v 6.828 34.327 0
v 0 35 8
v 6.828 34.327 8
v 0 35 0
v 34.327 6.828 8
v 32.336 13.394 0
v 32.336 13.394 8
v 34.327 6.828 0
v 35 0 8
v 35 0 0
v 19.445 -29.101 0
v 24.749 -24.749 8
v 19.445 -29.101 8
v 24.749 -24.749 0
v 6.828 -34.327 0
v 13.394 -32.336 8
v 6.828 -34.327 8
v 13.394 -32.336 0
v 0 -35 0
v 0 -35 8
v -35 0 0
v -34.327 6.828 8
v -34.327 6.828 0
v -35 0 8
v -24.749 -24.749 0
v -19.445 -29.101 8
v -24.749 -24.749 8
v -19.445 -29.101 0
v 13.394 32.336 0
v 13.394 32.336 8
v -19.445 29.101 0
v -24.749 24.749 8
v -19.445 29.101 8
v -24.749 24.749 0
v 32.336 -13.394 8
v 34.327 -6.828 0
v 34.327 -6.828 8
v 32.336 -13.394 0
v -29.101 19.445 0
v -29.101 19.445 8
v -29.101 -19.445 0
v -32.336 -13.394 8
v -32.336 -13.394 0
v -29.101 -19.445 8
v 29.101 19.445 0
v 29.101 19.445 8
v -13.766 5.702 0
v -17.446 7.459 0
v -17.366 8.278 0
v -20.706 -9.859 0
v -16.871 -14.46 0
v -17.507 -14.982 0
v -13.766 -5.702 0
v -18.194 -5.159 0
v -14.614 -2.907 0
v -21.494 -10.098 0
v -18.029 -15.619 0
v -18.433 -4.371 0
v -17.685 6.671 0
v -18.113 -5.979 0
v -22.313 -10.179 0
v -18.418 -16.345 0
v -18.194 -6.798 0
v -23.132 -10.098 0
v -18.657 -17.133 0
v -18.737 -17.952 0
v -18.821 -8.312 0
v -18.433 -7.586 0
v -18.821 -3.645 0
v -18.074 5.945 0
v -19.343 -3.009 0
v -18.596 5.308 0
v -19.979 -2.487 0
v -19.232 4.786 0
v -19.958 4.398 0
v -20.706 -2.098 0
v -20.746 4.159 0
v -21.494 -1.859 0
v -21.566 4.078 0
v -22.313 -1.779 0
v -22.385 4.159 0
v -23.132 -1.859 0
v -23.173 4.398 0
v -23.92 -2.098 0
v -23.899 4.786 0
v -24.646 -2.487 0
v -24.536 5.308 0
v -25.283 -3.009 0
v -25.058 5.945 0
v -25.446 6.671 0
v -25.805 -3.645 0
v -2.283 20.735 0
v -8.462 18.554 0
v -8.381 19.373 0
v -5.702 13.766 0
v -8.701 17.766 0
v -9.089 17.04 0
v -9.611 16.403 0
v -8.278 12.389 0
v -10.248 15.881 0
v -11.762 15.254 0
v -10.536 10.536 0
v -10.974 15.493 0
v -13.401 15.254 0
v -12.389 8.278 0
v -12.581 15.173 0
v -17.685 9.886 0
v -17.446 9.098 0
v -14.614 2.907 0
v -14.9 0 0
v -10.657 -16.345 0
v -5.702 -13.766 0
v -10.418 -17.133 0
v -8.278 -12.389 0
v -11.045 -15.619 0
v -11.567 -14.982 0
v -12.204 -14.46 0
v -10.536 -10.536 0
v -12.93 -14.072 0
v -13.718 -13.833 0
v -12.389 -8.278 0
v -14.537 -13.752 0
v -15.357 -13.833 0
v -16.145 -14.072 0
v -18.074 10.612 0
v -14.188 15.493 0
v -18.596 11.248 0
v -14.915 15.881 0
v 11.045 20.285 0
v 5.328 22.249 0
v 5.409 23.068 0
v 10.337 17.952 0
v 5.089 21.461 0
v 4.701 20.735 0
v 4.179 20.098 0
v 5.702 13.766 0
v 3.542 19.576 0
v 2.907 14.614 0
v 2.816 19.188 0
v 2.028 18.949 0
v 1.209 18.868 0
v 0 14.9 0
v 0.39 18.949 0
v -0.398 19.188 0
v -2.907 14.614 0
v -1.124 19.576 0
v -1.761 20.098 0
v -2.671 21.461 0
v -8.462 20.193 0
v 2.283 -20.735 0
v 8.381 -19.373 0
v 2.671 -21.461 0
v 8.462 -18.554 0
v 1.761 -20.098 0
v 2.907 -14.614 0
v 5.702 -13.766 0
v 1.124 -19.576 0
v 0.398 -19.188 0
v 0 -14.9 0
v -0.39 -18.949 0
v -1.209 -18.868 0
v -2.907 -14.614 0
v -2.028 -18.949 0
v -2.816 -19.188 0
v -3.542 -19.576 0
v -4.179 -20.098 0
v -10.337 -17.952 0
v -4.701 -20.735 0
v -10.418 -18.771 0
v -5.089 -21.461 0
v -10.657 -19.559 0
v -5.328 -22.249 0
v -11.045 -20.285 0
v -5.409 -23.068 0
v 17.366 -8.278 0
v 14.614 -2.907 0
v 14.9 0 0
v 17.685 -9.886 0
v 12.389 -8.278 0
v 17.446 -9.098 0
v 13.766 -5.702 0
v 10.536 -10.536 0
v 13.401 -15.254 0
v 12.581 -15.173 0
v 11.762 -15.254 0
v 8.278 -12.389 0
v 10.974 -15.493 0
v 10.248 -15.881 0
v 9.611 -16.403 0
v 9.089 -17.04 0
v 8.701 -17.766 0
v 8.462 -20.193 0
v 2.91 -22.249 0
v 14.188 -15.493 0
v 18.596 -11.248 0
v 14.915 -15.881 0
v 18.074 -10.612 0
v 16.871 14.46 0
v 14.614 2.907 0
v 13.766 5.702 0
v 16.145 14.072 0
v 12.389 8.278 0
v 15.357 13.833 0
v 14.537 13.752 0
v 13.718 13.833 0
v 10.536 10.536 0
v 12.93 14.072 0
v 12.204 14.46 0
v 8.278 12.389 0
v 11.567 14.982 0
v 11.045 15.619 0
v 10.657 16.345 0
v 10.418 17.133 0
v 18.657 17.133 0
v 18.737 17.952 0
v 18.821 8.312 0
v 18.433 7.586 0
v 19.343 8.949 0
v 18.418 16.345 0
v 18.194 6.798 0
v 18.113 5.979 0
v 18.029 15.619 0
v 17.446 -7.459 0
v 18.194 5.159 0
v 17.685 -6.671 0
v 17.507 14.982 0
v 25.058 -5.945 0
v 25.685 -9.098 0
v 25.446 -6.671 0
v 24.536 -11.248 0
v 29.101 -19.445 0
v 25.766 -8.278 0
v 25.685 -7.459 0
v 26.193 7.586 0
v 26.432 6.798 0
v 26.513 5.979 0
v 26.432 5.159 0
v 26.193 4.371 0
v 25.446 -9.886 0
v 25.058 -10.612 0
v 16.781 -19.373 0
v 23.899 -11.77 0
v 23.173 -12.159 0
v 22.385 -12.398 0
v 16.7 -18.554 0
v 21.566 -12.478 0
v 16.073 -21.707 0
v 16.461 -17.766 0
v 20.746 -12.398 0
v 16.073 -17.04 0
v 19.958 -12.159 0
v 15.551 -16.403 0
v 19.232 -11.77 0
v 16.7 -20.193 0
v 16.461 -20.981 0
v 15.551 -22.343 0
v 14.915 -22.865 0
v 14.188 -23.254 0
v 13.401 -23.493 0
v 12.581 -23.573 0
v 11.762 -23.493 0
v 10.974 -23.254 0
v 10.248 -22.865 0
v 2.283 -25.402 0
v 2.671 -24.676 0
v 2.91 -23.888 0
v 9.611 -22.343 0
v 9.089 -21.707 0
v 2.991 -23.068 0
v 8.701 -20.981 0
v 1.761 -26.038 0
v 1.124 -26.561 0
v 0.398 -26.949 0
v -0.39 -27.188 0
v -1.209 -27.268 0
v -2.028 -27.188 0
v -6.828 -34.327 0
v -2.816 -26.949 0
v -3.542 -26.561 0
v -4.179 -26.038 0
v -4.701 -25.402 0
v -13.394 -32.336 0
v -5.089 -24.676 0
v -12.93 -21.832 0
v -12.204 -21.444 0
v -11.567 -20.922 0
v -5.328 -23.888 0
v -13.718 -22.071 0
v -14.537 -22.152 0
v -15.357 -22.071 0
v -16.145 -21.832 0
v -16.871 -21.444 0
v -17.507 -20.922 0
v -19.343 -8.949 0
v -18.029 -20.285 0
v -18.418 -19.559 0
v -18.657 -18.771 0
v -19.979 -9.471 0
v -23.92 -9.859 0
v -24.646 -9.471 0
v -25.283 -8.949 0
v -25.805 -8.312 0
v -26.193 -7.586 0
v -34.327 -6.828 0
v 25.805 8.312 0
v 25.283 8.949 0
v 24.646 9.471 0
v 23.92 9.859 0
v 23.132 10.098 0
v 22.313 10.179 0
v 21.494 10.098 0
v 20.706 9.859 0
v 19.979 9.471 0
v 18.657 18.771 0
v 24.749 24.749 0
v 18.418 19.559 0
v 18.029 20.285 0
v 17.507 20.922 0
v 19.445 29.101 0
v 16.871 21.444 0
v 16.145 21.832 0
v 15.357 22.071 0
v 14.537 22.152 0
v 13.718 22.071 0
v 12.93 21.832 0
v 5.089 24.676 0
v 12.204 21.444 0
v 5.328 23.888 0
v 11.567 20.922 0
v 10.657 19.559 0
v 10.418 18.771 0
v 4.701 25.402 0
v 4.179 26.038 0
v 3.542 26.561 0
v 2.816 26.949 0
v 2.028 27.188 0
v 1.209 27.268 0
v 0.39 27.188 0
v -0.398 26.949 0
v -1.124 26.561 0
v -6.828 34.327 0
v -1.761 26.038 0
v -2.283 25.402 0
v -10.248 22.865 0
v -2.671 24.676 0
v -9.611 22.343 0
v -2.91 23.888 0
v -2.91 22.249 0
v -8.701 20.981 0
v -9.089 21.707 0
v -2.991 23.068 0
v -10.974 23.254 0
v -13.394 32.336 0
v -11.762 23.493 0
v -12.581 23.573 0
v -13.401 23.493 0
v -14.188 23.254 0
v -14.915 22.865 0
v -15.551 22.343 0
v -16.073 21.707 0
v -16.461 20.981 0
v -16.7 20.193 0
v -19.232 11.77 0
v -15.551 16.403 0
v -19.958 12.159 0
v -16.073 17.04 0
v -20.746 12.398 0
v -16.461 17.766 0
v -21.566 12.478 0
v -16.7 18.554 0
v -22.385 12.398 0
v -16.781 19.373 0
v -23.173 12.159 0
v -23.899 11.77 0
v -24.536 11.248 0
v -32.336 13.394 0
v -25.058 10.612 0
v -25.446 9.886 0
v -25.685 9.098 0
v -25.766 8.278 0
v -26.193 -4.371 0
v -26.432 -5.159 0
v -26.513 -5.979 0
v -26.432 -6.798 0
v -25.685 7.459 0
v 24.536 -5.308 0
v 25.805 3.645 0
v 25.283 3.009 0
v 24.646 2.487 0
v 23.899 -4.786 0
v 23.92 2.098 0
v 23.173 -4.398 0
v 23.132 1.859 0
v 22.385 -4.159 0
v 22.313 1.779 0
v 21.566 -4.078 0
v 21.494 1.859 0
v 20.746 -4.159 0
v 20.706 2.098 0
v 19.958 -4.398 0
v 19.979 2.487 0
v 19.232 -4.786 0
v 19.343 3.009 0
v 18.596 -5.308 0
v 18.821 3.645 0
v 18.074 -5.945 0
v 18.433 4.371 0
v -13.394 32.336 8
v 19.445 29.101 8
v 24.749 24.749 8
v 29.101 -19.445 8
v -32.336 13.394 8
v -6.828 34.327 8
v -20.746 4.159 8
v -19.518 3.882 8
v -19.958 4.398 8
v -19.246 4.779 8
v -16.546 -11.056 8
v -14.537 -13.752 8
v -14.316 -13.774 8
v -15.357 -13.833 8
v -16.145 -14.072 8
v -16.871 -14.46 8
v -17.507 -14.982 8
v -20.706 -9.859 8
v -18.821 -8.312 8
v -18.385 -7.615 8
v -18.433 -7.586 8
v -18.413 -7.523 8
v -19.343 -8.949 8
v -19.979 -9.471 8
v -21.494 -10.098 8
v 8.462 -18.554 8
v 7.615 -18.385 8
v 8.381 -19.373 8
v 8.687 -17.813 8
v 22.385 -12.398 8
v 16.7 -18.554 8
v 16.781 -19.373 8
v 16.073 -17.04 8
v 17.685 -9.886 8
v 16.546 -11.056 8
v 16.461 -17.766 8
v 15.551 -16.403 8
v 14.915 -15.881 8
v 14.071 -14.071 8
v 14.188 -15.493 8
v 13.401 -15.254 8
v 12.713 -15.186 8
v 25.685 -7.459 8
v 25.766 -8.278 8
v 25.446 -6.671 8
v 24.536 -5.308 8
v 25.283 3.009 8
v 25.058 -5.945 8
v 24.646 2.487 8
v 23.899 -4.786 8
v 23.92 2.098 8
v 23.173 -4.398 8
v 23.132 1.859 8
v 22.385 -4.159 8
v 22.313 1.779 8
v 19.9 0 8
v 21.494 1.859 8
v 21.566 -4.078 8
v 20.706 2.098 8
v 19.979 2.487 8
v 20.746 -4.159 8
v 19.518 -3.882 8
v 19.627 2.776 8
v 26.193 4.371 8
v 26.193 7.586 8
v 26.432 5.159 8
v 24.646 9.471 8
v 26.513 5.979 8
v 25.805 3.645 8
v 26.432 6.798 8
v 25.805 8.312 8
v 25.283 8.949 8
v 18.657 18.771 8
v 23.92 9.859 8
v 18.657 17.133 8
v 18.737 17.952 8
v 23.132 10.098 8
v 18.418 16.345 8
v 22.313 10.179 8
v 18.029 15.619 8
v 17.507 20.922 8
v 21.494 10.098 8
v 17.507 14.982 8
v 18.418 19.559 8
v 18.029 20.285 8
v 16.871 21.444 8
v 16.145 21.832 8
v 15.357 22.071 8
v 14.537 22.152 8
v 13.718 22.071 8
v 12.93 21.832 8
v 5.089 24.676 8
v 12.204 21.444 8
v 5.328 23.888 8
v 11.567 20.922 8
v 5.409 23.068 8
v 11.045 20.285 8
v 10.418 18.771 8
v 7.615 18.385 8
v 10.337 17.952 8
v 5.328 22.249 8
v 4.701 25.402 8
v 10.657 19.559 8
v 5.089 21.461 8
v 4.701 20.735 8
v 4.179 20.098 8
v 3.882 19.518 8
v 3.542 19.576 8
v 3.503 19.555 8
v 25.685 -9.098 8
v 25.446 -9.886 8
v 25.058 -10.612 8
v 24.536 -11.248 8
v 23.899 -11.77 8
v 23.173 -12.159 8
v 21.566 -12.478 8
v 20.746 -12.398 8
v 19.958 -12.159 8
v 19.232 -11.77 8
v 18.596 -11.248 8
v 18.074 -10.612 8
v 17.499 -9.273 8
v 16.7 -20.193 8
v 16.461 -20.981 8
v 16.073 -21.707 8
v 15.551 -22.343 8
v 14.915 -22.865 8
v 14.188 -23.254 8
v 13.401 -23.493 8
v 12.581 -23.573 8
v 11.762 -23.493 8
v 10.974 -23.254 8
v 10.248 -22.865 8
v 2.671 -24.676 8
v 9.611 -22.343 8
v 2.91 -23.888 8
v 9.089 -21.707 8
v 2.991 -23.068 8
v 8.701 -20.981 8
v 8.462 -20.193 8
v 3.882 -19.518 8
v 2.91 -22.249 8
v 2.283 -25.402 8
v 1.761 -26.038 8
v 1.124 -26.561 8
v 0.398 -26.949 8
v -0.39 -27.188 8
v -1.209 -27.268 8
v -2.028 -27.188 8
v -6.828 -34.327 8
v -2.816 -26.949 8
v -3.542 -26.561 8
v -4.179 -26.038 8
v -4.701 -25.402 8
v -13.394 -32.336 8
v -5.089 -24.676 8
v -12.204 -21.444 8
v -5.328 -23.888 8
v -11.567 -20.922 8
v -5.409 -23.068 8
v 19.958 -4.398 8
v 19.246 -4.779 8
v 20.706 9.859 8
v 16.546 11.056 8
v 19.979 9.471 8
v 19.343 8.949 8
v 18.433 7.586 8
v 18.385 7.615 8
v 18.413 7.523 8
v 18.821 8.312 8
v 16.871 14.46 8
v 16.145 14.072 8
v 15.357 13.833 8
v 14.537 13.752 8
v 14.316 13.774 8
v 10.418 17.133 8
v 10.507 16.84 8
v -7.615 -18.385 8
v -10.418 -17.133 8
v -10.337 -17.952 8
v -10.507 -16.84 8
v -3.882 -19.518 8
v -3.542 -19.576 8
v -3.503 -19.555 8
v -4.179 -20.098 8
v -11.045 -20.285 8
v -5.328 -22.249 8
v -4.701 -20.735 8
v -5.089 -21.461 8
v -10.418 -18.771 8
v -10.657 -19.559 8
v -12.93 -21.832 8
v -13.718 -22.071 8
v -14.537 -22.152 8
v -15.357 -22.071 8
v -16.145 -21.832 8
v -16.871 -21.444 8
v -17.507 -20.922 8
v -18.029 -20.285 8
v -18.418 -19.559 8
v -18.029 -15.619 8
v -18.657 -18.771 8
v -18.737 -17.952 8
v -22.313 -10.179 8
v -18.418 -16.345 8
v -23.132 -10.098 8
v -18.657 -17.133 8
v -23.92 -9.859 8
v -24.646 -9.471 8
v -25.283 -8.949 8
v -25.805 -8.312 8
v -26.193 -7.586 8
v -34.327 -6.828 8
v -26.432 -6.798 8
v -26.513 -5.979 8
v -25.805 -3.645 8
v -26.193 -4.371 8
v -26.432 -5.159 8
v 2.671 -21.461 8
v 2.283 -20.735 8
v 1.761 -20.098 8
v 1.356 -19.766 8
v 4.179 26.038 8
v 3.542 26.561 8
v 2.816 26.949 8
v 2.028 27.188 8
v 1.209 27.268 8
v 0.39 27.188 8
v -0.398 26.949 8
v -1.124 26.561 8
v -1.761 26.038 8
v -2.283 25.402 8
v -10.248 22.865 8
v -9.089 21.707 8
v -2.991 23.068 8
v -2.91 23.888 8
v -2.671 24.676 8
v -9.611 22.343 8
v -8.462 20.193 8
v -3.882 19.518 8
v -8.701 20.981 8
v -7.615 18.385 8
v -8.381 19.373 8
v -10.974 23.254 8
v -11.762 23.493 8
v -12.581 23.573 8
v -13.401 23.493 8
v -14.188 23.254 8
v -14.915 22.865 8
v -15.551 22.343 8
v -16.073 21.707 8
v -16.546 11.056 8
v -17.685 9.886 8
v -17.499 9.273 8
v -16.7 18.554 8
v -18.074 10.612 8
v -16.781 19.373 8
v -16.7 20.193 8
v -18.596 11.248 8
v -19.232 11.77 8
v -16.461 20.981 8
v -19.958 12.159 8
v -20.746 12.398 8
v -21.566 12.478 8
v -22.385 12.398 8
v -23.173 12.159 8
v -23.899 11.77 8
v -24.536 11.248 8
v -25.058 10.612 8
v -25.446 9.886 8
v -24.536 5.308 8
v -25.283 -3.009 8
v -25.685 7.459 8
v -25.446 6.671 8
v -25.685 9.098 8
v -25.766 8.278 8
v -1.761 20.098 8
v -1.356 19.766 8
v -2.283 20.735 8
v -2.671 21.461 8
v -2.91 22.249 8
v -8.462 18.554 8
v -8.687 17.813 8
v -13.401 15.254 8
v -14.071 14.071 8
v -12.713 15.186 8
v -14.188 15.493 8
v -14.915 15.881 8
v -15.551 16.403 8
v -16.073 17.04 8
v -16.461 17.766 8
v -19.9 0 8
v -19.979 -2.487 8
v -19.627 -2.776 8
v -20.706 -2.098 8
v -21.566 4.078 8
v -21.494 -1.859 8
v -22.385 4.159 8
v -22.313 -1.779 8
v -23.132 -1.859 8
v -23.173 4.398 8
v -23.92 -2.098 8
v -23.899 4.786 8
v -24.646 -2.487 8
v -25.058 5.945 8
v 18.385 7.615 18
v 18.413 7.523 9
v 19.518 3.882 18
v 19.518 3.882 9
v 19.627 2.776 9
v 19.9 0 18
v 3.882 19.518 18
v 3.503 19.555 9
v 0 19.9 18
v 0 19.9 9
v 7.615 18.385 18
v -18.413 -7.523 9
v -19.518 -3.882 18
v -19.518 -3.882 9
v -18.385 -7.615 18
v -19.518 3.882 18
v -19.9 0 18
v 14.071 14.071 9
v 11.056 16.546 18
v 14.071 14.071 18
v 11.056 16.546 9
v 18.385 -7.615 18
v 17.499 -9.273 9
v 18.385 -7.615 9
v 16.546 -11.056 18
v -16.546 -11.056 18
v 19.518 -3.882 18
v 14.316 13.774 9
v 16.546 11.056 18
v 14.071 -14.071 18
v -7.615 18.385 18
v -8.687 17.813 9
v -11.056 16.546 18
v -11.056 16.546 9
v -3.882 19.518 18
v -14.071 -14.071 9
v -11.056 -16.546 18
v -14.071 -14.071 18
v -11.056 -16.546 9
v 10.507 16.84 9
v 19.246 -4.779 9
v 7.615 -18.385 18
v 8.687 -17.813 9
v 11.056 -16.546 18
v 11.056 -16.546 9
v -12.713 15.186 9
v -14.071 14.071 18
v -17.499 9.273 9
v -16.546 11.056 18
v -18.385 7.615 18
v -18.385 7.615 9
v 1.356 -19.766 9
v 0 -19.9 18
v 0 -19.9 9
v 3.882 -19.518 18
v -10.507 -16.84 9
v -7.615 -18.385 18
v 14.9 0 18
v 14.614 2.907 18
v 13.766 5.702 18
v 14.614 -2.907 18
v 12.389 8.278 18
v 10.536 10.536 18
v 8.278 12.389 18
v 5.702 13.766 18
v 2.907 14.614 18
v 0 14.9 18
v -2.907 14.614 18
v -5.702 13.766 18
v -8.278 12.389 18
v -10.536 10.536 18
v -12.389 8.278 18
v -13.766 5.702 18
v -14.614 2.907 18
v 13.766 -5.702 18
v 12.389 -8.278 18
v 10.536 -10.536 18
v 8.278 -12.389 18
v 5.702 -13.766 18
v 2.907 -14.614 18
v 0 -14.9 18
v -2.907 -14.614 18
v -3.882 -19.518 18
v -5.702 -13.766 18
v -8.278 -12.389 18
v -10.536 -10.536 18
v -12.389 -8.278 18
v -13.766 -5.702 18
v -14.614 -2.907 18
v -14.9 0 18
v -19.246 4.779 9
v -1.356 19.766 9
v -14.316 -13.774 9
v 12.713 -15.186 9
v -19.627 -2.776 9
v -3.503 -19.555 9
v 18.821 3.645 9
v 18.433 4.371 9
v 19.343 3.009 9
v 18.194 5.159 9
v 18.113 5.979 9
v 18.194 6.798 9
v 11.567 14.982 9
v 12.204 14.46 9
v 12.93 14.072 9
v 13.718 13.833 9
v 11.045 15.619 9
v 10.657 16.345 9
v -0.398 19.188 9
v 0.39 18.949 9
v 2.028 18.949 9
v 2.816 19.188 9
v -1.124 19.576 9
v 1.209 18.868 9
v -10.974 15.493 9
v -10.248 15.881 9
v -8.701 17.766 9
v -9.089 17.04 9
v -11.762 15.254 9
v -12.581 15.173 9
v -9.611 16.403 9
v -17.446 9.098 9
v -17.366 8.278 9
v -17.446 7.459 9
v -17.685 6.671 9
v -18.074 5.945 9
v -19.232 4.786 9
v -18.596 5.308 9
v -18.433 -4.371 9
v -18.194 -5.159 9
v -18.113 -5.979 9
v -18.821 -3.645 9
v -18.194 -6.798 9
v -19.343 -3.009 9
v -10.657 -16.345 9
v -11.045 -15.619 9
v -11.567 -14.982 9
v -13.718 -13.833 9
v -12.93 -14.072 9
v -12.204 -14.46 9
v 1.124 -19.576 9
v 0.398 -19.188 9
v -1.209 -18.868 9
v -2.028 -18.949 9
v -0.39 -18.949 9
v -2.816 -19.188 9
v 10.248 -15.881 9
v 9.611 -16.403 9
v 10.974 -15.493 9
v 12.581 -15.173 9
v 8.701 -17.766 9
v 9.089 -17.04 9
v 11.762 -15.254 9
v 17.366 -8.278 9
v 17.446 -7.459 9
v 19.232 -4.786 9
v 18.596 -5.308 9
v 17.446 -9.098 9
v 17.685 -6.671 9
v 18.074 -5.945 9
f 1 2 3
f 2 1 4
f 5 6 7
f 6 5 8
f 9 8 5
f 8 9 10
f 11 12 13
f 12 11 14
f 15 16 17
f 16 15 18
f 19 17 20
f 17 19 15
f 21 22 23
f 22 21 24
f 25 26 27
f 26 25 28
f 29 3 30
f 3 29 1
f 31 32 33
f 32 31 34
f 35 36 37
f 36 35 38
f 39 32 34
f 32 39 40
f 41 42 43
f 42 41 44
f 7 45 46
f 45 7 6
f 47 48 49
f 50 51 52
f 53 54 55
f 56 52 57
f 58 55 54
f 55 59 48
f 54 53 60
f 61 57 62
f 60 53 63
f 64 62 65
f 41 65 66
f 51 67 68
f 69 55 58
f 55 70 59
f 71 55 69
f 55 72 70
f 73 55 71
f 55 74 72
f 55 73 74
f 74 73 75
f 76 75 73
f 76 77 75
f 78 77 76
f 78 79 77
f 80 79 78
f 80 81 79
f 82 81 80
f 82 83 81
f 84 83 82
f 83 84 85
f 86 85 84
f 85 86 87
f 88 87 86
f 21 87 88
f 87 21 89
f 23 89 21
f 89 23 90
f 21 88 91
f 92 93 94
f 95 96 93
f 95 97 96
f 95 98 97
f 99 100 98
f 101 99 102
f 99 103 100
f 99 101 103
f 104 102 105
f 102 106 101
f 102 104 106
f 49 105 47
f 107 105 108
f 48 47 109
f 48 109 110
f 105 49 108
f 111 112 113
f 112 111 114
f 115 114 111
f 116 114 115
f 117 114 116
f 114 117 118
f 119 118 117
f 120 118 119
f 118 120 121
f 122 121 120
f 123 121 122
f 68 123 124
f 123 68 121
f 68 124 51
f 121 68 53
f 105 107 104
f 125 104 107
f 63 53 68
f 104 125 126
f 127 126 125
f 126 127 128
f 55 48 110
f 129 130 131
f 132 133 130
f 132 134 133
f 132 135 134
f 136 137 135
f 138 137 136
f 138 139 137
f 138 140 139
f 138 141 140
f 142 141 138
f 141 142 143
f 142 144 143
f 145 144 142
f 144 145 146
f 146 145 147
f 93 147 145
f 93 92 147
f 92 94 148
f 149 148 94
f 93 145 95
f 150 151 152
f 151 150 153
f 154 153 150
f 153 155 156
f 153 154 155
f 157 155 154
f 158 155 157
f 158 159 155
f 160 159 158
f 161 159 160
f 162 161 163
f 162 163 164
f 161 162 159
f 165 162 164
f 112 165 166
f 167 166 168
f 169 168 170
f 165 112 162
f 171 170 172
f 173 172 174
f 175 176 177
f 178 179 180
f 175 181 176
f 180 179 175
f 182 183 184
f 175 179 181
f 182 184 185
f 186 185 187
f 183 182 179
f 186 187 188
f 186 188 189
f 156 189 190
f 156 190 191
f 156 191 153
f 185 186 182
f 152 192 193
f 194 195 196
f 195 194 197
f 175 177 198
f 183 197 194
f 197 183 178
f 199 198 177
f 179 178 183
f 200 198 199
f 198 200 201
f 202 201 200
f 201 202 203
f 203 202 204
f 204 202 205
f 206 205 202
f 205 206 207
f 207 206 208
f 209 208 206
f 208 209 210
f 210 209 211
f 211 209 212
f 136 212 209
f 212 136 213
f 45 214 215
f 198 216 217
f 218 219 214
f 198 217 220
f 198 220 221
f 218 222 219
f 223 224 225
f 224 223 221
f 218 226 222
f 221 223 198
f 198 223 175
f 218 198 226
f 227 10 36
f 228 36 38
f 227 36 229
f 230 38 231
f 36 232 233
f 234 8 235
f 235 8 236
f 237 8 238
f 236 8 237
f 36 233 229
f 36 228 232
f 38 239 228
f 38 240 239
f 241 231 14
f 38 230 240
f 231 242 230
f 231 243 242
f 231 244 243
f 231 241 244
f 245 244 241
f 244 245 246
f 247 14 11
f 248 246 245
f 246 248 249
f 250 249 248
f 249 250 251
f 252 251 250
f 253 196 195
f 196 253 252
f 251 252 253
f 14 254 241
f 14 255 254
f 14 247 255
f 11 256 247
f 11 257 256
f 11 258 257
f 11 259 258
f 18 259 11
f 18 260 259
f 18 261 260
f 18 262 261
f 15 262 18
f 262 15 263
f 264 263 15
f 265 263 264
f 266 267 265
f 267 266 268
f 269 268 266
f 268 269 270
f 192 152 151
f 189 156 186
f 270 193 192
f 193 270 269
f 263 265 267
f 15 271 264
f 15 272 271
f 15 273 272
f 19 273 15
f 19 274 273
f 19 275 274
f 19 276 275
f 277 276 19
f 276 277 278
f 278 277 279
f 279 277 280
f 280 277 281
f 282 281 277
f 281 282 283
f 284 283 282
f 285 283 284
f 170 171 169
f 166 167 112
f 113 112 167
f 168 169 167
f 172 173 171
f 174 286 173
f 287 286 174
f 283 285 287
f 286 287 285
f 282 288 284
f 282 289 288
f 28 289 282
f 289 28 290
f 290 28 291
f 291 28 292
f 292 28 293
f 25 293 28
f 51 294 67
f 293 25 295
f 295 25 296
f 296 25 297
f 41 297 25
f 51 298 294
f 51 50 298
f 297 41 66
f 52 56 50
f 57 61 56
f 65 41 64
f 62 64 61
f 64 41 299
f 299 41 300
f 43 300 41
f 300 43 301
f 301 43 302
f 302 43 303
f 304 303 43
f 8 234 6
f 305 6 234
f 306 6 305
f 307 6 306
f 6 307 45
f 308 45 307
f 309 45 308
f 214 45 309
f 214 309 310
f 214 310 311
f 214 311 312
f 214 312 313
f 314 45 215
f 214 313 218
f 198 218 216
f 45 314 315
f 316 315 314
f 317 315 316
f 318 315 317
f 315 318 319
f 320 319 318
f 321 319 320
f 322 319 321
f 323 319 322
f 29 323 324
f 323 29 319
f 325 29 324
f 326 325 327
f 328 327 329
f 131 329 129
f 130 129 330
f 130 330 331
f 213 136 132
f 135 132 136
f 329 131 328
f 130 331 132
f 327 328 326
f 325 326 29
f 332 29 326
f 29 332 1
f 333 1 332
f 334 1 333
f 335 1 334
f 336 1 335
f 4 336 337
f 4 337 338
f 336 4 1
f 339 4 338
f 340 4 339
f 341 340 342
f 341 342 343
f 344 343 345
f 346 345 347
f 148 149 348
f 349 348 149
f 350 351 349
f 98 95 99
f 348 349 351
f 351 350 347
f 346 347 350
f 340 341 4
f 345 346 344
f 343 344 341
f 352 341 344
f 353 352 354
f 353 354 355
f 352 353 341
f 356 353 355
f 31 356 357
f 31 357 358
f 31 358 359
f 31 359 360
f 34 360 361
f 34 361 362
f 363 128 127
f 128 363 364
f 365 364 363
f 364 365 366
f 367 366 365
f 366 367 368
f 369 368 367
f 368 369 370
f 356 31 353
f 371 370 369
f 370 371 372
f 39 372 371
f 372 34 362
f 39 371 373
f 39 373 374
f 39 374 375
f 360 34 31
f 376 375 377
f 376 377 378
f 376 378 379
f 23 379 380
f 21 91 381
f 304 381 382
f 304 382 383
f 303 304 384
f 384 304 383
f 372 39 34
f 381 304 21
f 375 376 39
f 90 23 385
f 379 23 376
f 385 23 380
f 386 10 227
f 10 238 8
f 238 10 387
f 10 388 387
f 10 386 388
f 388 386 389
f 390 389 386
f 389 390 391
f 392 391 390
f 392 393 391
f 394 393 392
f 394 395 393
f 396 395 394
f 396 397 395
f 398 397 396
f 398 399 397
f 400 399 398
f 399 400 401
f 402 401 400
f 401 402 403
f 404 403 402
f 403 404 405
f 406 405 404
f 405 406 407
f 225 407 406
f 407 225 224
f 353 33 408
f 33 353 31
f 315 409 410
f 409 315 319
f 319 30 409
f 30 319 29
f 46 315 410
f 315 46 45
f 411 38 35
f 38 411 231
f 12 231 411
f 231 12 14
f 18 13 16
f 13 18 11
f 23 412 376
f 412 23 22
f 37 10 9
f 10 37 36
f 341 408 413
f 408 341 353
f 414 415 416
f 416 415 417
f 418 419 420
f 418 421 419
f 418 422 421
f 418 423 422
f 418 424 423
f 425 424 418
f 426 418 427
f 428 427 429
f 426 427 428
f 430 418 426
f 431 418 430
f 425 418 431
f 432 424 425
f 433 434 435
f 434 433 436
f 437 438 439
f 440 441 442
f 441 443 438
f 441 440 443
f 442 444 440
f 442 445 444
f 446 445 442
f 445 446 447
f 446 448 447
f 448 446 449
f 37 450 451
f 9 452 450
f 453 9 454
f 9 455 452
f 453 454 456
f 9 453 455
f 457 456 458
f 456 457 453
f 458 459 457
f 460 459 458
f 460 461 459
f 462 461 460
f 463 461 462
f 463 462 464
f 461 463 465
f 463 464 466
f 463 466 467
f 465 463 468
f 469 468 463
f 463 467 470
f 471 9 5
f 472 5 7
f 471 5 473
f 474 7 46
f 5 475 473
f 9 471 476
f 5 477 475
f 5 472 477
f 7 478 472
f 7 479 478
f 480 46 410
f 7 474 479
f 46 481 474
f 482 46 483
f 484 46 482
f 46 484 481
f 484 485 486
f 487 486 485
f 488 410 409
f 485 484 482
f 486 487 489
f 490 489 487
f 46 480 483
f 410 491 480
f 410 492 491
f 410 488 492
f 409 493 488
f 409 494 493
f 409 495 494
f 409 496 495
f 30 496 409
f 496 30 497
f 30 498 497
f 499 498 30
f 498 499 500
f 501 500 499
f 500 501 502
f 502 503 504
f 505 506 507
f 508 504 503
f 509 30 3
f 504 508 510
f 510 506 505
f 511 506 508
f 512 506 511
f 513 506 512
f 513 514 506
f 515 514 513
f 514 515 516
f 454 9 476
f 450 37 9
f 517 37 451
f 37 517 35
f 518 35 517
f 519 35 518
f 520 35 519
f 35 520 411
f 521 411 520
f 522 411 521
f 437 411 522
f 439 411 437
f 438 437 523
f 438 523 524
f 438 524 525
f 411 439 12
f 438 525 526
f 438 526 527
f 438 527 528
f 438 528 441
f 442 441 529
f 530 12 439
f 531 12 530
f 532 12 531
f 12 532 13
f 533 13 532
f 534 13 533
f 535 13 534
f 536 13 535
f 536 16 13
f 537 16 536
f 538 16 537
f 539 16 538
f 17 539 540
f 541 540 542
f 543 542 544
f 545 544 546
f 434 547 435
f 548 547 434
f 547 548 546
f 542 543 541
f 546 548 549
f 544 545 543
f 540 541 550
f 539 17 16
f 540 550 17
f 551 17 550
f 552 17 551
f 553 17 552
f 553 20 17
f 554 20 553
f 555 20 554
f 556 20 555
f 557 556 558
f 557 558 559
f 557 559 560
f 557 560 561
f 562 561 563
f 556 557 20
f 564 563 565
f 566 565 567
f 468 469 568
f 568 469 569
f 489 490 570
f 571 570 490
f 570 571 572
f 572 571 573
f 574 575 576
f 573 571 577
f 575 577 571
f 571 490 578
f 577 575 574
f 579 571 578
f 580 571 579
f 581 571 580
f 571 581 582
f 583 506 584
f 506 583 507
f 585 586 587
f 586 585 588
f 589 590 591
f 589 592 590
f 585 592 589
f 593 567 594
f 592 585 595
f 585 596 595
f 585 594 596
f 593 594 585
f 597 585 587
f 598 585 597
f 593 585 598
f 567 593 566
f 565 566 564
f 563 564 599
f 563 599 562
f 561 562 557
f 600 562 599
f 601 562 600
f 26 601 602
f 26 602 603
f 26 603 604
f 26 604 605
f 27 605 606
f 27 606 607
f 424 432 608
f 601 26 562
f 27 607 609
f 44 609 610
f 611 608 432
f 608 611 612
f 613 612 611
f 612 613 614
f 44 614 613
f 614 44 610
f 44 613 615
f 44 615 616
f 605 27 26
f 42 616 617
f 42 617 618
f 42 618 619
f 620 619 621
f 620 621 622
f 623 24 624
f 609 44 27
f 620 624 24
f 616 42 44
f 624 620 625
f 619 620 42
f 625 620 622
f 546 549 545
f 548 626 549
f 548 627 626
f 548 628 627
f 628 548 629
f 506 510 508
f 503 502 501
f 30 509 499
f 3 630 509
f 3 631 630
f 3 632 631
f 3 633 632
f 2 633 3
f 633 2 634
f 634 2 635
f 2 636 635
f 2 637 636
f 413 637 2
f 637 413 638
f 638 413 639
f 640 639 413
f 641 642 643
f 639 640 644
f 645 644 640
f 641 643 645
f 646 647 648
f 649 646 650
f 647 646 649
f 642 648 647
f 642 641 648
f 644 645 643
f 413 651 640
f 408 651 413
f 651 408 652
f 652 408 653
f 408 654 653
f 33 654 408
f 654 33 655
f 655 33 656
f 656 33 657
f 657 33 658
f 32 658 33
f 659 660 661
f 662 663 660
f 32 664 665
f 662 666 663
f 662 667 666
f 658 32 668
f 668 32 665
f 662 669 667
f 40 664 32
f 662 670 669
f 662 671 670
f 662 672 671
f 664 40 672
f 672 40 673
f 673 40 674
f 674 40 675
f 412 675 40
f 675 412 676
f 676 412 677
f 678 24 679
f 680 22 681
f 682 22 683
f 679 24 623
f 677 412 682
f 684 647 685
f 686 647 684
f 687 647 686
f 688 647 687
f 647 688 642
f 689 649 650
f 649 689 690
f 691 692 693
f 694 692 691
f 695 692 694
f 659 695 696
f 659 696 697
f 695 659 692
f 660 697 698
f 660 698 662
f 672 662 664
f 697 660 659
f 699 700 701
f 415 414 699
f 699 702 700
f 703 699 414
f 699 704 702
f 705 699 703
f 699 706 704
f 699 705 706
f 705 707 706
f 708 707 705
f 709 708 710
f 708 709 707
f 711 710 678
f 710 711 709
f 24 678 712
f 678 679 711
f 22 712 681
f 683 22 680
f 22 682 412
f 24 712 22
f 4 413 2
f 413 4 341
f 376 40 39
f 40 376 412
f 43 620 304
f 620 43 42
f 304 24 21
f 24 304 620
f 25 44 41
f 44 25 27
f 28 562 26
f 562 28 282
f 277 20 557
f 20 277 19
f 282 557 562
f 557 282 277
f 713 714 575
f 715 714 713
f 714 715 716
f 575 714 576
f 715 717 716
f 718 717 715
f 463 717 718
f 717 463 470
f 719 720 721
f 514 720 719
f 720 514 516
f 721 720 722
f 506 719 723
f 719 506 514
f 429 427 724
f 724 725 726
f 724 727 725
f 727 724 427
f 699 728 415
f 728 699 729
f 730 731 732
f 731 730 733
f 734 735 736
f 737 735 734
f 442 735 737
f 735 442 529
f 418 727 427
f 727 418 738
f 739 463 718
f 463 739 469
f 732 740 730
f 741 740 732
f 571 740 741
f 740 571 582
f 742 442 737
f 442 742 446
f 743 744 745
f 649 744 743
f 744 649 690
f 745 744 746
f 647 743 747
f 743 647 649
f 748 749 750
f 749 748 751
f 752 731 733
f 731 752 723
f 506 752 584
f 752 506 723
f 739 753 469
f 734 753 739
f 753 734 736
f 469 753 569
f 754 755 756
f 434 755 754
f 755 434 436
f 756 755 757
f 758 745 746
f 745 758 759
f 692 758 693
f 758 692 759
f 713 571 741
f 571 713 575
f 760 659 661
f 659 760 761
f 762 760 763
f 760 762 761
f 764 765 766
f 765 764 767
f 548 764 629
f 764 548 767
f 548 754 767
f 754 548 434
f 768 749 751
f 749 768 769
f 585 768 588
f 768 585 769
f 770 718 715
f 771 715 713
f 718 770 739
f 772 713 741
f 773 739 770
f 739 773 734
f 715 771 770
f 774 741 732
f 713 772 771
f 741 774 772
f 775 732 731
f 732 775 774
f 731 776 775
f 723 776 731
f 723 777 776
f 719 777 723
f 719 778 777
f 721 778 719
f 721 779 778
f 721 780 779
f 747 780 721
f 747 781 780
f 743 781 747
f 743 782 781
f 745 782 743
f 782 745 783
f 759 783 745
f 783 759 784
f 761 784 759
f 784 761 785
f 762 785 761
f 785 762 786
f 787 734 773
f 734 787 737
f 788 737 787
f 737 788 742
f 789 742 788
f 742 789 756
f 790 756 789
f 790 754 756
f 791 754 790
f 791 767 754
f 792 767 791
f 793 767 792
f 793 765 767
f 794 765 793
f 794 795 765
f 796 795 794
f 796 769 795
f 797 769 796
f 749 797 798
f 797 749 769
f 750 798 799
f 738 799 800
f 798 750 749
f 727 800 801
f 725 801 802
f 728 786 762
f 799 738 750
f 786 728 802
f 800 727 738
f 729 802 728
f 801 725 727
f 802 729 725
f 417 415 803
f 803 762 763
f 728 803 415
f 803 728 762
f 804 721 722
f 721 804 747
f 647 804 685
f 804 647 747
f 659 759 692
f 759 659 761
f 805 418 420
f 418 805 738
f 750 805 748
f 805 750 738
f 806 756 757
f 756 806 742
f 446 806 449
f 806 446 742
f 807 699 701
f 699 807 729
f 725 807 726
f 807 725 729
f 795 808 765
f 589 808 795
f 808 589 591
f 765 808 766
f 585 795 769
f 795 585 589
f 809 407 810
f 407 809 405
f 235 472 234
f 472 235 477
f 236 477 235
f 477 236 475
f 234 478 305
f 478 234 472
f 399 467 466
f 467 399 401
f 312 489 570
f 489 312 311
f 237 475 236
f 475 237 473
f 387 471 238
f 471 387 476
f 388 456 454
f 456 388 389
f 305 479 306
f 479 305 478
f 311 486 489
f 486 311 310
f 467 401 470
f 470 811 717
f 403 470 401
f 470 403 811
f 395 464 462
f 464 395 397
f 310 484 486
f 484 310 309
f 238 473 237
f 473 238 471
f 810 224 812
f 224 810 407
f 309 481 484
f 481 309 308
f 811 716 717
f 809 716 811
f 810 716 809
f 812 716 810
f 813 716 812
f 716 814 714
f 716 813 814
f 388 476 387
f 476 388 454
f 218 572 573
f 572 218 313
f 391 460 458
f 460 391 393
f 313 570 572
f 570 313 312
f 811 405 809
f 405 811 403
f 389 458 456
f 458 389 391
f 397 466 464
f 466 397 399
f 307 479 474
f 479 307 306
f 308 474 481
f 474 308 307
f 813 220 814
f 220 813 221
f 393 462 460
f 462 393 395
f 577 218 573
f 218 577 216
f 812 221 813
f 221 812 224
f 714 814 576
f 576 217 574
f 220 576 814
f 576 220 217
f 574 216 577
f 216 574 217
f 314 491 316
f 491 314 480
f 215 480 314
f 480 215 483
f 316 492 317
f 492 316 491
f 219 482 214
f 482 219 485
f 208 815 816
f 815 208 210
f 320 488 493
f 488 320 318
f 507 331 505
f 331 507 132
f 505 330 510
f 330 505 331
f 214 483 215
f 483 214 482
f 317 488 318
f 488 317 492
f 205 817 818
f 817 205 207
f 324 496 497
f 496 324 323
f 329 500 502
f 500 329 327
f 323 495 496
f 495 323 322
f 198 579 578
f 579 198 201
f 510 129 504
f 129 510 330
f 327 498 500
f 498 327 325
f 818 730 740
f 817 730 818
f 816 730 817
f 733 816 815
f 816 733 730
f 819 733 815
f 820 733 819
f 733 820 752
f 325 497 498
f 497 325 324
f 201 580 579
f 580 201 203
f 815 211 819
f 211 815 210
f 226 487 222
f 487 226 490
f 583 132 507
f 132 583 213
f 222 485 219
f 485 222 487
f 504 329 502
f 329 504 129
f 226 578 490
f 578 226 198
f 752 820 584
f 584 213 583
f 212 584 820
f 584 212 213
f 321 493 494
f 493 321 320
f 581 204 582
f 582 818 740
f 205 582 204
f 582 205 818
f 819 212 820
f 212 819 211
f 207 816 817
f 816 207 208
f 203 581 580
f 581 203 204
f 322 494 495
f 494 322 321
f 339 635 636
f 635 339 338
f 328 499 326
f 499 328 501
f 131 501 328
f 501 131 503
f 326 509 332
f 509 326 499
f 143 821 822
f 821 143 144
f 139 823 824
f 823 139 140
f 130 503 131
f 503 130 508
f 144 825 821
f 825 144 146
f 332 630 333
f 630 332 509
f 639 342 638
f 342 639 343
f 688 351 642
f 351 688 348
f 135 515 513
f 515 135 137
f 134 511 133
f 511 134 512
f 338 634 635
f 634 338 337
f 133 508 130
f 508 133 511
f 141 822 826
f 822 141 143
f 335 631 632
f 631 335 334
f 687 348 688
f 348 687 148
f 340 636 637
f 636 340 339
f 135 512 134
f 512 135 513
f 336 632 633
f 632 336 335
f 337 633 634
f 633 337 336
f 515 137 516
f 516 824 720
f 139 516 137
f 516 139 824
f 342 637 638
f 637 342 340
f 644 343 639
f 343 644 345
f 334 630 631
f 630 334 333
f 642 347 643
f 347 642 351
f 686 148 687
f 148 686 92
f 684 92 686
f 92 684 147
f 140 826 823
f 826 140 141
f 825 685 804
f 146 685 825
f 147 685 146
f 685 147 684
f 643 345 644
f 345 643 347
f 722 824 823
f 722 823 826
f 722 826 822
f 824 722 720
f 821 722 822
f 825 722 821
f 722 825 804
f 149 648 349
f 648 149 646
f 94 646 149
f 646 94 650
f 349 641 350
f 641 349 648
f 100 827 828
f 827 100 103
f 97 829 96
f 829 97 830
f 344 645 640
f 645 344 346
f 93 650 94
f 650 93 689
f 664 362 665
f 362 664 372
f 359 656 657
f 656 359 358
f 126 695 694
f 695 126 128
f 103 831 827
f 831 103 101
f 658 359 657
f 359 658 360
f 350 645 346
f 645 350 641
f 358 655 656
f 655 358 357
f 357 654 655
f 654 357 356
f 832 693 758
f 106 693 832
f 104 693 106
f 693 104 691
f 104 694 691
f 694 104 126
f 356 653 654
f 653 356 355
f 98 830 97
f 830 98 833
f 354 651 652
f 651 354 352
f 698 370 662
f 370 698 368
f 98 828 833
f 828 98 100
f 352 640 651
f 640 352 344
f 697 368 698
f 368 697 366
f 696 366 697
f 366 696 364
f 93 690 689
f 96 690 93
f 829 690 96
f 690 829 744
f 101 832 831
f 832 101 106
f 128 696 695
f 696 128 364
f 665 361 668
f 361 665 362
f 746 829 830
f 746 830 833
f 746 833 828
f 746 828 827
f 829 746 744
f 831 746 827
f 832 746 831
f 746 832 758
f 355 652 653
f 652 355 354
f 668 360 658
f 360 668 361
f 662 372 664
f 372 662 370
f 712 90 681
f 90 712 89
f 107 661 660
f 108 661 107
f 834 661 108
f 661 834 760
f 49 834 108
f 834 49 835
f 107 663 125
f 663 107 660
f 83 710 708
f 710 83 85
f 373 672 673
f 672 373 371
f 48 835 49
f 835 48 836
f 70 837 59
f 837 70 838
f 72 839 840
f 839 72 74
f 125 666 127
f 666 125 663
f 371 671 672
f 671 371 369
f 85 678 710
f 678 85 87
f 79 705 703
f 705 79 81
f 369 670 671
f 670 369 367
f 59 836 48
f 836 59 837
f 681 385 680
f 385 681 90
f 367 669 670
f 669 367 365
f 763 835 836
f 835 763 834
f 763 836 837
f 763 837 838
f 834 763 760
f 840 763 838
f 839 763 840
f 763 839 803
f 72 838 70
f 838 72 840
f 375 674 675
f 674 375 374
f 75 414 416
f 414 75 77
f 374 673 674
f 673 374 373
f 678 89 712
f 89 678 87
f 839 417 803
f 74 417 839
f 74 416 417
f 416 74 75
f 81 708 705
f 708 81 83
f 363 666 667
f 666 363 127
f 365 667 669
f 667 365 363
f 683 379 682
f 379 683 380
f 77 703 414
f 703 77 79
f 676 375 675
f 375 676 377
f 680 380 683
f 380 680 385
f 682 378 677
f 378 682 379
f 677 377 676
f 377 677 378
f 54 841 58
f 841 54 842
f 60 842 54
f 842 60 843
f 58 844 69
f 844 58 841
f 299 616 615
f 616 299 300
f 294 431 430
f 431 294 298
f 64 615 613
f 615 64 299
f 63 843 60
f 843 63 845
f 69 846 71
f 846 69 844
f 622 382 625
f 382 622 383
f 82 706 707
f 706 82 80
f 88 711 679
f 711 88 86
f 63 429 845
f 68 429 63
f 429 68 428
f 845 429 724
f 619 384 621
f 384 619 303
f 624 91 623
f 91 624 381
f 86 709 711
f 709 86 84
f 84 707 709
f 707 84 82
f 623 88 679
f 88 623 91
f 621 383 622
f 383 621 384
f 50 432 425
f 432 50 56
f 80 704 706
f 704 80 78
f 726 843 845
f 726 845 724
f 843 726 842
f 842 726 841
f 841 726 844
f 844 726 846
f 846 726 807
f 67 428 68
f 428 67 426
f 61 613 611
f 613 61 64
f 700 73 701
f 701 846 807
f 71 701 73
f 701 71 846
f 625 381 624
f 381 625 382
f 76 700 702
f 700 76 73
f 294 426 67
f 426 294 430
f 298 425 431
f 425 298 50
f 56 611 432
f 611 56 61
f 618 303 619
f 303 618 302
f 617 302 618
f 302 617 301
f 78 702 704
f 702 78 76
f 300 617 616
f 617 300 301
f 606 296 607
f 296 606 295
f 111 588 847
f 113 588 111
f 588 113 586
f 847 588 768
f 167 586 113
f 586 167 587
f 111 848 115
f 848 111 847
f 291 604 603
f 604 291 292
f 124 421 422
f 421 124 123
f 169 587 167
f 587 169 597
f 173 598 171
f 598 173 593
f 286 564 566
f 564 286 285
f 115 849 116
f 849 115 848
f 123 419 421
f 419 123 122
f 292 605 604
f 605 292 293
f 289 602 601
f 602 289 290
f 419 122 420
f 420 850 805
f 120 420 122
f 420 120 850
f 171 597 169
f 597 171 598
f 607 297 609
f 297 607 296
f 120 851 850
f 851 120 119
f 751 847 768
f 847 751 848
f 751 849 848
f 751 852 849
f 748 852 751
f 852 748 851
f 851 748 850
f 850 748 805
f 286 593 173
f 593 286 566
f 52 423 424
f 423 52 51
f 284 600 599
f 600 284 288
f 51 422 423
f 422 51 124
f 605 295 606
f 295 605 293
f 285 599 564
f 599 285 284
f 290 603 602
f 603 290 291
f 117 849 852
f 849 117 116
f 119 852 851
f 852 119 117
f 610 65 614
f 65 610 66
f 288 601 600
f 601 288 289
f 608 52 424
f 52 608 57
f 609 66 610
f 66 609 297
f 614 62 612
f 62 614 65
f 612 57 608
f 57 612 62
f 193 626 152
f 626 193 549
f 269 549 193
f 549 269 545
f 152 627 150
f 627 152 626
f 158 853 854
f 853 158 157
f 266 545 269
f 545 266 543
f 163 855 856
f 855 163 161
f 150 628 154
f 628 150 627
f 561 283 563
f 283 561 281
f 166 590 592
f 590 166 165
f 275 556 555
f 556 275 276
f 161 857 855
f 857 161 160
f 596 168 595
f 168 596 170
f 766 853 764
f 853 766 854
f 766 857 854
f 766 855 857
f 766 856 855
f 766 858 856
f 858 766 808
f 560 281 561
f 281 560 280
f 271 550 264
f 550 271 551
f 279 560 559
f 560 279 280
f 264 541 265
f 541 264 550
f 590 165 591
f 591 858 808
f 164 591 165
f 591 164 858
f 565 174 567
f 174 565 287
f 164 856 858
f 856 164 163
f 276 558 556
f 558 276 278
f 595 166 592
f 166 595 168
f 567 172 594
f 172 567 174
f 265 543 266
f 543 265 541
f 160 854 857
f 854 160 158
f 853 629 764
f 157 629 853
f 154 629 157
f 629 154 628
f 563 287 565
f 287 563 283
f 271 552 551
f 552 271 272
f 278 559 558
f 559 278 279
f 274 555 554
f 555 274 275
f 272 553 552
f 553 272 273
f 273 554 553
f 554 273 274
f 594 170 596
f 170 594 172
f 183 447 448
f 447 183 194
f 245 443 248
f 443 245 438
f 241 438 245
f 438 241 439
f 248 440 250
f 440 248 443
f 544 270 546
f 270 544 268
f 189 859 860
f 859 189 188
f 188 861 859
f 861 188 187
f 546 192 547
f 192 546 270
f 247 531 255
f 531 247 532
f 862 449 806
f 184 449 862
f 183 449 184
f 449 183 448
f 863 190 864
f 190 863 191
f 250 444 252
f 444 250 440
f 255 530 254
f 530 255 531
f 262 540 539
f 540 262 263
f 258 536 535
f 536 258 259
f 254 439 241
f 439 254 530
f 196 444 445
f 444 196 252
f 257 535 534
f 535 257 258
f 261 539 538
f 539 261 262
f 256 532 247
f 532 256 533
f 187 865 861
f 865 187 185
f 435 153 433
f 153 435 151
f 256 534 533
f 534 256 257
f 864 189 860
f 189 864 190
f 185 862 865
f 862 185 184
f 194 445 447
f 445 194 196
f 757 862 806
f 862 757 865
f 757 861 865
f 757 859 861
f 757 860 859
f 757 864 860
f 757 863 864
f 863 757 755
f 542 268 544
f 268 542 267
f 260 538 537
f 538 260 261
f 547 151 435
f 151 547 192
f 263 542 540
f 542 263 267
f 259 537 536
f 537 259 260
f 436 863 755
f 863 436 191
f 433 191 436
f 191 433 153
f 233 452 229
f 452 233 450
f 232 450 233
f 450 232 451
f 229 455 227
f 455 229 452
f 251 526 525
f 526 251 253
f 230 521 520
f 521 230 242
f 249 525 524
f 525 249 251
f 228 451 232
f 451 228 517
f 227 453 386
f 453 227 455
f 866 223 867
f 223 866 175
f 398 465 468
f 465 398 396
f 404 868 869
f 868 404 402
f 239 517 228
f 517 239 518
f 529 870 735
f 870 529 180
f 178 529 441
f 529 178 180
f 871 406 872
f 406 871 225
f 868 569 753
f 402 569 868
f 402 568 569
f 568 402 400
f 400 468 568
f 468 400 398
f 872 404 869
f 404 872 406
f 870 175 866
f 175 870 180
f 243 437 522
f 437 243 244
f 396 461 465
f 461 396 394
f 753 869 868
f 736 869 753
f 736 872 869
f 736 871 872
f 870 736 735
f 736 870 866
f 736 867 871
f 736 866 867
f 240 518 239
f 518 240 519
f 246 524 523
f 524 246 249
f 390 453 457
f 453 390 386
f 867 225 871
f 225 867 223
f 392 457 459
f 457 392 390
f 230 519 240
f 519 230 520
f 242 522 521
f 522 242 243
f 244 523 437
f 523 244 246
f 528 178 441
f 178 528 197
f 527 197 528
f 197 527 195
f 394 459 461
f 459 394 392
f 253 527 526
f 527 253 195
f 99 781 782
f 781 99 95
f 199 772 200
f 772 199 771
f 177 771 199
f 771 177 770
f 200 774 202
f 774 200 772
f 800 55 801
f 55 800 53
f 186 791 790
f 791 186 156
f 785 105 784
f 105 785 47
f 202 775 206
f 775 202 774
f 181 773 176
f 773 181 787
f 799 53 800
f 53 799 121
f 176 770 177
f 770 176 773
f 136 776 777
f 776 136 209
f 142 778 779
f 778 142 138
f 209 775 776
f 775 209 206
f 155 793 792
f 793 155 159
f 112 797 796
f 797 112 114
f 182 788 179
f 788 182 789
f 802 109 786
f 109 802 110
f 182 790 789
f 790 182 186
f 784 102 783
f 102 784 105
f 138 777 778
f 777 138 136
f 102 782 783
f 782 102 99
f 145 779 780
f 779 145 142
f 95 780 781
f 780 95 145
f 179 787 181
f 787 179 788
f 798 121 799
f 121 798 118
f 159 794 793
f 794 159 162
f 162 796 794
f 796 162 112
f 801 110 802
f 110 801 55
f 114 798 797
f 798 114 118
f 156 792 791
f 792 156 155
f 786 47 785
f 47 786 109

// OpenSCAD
$fn = 32;

// ----------------------------------------------------------------------
// Flange Ø70 x 8
// 10 holes on a Ø46.2 bolt circle, bolted joints
// ----------------------------------------------------------------------

// --- parameters (mm) ---
flange_d = 70;   // outside diameter of the flange
thickness = 8;   // flange thickness
holes = 10;      // number of bolt holes
pcd = 46.2;      // bolt circle diameter
start_deg = 15;  // angle of the first hole, from +X
hole_d = 8.4;    // bolt hole diameter
bore_d = 29.8;   // central through bore
hub_d = 39.8;    // hub outside diameter
hub_h = 10;      // hub height above the flange face (0 = no hub)

// --- derived feature positions (mm) ---
height = thickness + hub_h;  // = 18   overall height of the part
pcd_r = pcd / 2;             // = 23.1   bolt circle radius
hole_step = 360 / holes;     // = 36   angular pitch
feature_centers = [
  [pcd_r * cos(start_deg + 0 * hole_step), pcd_r * sin(start_deg + 0 * hole_step)],
  [pcd_r * cos(start_deg + 1 * hole_step), pcd_r * sin(start_deg + 1 * hole_step)],
  [pcd_r * cos(start_deg + 2 * hole_step), pcd_r * sin(start_deg + 2 * hole_step)],
  [pcd_r * cos(start_deg + 3 * hole_step), pcd_r * sin(start_deg + 3 * hole_step)],
  [pcd_r * cos(start_deg + 4 * hole_step), pcd_r * sin(start_deg + 4 * hole_step)],
  [pcd_r * cos(start_deg + 5 * hole_step), pcd_r * sin(start_deg + 5 * hole_step)],
  [pcd_r * cos(start_deg + 6 * hole_step), pcd_r * sin(start_deg + 6 * hole_step)],
  [pcd_r * cos(start_deg + 7 * hole_step), pcd_r * sin(start_deg + 7 * hole_step)],
  [pcd_r * cos(start_deg + 8 * hole_step), pcd_r * sin(start_deg + 8 * hole_step)],
  [pcd_r * cos(start_deg + 9 * hole_step), pcd_r * sin(start_deg + 9 * hole_step)]
];   // bolt hole centres on the pitch circle

// flange disc, every hole and the bore cut straight through
difference() {
  union() {
    cylinder(d = flange_d, h = thickness);
    cylinder(d = hub_d, h = height);  // hub, overlapped into the flange
  }
  translate([0, 0, -1]) cylinder(d = bore_d, h = height + 2);  // bore, through
  for (centre = feature_centers)
    translate([centre[0], centre[1], -1]) cylinder(d = hole_d, h = thickness + 2);
}
